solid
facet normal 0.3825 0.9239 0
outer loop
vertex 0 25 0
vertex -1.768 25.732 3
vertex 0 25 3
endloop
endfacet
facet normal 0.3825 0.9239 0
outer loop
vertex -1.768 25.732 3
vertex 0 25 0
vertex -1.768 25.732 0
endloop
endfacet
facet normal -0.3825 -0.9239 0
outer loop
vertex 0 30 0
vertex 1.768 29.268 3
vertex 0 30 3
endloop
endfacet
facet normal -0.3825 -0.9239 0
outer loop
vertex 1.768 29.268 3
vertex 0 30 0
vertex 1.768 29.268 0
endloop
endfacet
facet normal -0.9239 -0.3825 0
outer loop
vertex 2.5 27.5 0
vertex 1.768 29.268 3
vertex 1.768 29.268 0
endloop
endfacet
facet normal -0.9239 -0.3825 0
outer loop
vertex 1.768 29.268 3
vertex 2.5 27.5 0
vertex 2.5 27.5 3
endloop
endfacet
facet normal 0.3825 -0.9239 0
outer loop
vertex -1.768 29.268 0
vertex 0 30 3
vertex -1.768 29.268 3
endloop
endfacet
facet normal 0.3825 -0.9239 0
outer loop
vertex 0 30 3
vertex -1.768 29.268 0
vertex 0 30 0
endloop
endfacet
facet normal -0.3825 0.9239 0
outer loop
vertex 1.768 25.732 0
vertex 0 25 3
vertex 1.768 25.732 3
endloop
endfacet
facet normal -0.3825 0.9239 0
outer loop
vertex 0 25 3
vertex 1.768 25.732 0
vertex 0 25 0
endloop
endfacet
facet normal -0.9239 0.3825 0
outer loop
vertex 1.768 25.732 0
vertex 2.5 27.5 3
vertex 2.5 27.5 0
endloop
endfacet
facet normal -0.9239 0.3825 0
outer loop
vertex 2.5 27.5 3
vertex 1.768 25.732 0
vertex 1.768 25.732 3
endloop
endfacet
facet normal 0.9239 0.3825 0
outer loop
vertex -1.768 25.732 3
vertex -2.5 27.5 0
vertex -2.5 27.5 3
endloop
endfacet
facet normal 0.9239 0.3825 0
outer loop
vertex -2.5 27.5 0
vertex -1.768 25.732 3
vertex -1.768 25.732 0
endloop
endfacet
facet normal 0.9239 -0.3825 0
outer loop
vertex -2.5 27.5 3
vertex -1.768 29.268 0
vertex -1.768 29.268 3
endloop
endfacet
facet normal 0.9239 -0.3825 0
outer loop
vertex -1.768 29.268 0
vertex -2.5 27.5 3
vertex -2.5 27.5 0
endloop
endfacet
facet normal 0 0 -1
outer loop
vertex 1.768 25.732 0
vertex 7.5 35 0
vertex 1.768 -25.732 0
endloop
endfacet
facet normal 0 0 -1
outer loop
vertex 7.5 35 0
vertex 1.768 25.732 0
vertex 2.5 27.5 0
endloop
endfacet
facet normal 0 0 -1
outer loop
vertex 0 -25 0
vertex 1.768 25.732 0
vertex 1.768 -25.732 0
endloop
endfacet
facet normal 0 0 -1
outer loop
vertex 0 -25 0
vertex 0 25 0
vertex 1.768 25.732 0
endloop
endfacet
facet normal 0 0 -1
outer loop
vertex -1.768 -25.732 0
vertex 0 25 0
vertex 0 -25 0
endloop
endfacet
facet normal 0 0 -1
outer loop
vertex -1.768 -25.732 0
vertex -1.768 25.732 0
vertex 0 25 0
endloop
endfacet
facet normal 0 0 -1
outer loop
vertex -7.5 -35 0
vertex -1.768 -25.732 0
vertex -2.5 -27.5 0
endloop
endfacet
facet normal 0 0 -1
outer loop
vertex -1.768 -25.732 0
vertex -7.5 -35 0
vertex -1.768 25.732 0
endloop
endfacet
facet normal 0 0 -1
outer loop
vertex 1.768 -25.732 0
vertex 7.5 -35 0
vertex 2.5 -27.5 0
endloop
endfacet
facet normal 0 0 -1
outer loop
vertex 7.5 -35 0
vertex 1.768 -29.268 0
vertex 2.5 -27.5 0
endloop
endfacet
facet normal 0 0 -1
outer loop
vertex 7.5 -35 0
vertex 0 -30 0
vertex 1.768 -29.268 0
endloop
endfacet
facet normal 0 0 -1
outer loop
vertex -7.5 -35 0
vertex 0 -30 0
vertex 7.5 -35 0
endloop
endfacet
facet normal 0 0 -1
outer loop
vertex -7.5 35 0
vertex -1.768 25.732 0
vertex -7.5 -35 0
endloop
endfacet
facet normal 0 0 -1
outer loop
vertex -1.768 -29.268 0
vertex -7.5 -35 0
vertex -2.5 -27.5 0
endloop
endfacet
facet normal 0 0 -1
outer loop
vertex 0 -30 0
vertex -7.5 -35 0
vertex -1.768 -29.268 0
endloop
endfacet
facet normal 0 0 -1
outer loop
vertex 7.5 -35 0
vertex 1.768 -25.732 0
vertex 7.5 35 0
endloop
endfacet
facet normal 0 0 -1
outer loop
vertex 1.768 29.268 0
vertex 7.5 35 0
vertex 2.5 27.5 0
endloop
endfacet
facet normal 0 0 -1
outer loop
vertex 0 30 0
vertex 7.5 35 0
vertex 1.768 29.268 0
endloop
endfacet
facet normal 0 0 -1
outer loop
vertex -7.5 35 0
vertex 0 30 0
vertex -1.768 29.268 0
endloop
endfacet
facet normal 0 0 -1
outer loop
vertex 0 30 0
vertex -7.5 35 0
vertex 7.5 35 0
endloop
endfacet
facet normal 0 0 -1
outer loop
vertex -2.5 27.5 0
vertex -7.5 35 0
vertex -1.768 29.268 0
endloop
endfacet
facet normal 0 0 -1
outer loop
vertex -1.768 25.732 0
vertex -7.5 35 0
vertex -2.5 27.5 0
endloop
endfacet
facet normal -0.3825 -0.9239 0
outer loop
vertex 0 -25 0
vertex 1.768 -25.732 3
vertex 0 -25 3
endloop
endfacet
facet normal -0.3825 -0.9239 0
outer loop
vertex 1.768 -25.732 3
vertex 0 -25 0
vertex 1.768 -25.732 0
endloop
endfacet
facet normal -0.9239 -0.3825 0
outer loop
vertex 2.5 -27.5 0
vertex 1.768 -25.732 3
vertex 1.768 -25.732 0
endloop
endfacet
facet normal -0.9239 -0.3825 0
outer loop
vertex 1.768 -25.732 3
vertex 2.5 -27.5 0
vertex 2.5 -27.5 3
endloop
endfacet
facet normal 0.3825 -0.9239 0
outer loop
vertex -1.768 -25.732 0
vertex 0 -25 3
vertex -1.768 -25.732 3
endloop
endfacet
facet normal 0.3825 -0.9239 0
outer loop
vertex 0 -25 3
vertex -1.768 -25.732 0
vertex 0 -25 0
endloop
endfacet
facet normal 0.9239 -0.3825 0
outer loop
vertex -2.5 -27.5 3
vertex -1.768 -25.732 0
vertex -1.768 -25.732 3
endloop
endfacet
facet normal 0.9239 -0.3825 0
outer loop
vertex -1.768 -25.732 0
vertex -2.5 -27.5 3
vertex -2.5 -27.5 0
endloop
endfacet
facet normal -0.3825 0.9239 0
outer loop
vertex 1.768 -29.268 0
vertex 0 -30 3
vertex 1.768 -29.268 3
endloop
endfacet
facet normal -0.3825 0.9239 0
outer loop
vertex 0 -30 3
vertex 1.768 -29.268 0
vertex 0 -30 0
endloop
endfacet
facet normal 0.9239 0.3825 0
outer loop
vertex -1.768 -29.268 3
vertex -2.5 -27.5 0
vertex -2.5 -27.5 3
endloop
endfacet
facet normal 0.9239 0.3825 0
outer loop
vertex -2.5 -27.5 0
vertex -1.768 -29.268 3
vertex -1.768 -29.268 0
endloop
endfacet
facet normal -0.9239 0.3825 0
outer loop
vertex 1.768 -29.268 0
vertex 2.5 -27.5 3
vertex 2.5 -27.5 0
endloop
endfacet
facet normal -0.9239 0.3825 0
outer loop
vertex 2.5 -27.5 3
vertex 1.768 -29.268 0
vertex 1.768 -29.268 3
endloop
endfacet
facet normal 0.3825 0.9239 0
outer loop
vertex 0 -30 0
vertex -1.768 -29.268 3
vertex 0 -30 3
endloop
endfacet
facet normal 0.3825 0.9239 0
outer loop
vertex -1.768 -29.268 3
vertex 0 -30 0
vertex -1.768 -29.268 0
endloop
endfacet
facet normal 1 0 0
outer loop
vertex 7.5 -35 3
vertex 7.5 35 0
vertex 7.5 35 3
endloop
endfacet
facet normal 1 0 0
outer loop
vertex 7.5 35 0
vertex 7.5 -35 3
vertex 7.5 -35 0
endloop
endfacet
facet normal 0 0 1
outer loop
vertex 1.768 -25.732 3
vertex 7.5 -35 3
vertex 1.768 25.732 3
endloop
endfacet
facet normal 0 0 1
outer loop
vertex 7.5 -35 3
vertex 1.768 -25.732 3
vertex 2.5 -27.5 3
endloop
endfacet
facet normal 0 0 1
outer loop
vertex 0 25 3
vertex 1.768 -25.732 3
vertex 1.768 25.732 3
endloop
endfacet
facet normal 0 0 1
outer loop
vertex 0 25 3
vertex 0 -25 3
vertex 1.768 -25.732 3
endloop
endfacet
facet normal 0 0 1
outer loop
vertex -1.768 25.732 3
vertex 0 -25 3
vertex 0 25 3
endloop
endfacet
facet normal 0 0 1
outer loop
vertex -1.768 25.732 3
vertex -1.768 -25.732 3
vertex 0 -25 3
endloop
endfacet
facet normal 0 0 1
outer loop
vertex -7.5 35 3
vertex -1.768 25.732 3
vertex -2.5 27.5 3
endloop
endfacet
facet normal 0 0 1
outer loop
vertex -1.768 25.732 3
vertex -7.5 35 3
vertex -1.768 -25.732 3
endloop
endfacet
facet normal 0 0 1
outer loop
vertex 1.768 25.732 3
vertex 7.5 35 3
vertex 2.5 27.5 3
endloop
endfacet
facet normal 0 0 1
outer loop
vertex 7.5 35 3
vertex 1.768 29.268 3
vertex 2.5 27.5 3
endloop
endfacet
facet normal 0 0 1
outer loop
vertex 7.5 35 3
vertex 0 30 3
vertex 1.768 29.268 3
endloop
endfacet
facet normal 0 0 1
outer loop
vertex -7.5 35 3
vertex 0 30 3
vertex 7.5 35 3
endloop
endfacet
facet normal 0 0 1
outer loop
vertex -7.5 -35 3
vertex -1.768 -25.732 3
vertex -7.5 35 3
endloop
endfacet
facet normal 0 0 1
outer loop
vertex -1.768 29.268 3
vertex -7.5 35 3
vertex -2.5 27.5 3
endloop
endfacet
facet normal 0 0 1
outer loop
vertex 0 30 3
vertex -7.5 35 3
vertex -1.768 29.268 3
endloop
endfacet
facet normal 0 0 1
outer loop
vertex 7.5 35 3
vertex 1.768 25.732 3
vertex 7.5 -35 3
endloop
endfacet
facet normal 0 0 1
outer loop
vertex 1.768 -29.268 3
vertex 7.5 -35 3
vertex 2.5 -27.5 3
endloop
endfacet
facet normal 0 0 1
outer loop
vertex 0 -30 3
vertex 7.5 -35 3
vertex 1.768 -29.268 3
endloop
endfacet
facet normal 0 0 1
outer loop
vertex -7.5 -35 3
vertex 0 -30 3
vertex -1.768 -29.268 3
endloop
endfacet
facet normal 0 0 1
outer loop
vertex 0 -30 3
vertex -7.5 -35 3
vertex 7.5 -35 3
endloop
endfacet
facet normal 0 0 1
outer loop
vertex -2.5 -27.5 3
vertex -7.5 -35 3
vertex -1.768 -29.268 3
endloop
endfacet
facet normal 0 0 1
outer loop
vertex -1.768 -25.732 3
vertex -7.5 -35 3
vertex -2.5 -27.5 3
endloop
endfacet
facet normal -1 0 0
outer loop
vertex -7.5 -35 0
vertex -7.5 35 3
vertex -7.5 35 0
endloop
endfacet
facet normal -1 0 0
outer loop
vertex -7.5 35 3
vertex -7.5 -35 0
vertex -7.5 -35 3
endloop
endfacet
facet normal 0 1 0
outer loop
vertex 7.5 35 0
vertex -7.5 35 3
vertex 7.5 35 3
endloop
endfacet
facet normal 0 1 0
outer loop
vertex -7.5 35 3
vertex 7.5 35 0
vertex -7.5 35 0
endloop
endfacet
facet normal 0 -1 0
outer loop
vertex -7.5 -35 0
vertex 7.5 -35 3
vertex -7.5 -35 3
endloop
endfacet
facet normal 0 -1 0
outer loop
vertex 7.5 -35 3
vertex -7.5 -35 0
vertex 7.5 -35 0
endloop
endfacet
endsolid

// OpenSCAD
// create a spacer for the new brass extruder assembly

// 15x70x3
length = 70;
hole_space=55;
hole_size=5;

difference() {
    translate([-7.5,-1*(length/2),0])cube([15,length,3]);

    union() {
        translate([0, 1*(length/2-((length-hole_space)/2)),0])cylinder(d=hole_size,h=4,center=false);
        translate([0,-1*(length/2-((length-hole_space)/2)),0])cylinder(d=hole_size,h=4,center=false);
    }
}
